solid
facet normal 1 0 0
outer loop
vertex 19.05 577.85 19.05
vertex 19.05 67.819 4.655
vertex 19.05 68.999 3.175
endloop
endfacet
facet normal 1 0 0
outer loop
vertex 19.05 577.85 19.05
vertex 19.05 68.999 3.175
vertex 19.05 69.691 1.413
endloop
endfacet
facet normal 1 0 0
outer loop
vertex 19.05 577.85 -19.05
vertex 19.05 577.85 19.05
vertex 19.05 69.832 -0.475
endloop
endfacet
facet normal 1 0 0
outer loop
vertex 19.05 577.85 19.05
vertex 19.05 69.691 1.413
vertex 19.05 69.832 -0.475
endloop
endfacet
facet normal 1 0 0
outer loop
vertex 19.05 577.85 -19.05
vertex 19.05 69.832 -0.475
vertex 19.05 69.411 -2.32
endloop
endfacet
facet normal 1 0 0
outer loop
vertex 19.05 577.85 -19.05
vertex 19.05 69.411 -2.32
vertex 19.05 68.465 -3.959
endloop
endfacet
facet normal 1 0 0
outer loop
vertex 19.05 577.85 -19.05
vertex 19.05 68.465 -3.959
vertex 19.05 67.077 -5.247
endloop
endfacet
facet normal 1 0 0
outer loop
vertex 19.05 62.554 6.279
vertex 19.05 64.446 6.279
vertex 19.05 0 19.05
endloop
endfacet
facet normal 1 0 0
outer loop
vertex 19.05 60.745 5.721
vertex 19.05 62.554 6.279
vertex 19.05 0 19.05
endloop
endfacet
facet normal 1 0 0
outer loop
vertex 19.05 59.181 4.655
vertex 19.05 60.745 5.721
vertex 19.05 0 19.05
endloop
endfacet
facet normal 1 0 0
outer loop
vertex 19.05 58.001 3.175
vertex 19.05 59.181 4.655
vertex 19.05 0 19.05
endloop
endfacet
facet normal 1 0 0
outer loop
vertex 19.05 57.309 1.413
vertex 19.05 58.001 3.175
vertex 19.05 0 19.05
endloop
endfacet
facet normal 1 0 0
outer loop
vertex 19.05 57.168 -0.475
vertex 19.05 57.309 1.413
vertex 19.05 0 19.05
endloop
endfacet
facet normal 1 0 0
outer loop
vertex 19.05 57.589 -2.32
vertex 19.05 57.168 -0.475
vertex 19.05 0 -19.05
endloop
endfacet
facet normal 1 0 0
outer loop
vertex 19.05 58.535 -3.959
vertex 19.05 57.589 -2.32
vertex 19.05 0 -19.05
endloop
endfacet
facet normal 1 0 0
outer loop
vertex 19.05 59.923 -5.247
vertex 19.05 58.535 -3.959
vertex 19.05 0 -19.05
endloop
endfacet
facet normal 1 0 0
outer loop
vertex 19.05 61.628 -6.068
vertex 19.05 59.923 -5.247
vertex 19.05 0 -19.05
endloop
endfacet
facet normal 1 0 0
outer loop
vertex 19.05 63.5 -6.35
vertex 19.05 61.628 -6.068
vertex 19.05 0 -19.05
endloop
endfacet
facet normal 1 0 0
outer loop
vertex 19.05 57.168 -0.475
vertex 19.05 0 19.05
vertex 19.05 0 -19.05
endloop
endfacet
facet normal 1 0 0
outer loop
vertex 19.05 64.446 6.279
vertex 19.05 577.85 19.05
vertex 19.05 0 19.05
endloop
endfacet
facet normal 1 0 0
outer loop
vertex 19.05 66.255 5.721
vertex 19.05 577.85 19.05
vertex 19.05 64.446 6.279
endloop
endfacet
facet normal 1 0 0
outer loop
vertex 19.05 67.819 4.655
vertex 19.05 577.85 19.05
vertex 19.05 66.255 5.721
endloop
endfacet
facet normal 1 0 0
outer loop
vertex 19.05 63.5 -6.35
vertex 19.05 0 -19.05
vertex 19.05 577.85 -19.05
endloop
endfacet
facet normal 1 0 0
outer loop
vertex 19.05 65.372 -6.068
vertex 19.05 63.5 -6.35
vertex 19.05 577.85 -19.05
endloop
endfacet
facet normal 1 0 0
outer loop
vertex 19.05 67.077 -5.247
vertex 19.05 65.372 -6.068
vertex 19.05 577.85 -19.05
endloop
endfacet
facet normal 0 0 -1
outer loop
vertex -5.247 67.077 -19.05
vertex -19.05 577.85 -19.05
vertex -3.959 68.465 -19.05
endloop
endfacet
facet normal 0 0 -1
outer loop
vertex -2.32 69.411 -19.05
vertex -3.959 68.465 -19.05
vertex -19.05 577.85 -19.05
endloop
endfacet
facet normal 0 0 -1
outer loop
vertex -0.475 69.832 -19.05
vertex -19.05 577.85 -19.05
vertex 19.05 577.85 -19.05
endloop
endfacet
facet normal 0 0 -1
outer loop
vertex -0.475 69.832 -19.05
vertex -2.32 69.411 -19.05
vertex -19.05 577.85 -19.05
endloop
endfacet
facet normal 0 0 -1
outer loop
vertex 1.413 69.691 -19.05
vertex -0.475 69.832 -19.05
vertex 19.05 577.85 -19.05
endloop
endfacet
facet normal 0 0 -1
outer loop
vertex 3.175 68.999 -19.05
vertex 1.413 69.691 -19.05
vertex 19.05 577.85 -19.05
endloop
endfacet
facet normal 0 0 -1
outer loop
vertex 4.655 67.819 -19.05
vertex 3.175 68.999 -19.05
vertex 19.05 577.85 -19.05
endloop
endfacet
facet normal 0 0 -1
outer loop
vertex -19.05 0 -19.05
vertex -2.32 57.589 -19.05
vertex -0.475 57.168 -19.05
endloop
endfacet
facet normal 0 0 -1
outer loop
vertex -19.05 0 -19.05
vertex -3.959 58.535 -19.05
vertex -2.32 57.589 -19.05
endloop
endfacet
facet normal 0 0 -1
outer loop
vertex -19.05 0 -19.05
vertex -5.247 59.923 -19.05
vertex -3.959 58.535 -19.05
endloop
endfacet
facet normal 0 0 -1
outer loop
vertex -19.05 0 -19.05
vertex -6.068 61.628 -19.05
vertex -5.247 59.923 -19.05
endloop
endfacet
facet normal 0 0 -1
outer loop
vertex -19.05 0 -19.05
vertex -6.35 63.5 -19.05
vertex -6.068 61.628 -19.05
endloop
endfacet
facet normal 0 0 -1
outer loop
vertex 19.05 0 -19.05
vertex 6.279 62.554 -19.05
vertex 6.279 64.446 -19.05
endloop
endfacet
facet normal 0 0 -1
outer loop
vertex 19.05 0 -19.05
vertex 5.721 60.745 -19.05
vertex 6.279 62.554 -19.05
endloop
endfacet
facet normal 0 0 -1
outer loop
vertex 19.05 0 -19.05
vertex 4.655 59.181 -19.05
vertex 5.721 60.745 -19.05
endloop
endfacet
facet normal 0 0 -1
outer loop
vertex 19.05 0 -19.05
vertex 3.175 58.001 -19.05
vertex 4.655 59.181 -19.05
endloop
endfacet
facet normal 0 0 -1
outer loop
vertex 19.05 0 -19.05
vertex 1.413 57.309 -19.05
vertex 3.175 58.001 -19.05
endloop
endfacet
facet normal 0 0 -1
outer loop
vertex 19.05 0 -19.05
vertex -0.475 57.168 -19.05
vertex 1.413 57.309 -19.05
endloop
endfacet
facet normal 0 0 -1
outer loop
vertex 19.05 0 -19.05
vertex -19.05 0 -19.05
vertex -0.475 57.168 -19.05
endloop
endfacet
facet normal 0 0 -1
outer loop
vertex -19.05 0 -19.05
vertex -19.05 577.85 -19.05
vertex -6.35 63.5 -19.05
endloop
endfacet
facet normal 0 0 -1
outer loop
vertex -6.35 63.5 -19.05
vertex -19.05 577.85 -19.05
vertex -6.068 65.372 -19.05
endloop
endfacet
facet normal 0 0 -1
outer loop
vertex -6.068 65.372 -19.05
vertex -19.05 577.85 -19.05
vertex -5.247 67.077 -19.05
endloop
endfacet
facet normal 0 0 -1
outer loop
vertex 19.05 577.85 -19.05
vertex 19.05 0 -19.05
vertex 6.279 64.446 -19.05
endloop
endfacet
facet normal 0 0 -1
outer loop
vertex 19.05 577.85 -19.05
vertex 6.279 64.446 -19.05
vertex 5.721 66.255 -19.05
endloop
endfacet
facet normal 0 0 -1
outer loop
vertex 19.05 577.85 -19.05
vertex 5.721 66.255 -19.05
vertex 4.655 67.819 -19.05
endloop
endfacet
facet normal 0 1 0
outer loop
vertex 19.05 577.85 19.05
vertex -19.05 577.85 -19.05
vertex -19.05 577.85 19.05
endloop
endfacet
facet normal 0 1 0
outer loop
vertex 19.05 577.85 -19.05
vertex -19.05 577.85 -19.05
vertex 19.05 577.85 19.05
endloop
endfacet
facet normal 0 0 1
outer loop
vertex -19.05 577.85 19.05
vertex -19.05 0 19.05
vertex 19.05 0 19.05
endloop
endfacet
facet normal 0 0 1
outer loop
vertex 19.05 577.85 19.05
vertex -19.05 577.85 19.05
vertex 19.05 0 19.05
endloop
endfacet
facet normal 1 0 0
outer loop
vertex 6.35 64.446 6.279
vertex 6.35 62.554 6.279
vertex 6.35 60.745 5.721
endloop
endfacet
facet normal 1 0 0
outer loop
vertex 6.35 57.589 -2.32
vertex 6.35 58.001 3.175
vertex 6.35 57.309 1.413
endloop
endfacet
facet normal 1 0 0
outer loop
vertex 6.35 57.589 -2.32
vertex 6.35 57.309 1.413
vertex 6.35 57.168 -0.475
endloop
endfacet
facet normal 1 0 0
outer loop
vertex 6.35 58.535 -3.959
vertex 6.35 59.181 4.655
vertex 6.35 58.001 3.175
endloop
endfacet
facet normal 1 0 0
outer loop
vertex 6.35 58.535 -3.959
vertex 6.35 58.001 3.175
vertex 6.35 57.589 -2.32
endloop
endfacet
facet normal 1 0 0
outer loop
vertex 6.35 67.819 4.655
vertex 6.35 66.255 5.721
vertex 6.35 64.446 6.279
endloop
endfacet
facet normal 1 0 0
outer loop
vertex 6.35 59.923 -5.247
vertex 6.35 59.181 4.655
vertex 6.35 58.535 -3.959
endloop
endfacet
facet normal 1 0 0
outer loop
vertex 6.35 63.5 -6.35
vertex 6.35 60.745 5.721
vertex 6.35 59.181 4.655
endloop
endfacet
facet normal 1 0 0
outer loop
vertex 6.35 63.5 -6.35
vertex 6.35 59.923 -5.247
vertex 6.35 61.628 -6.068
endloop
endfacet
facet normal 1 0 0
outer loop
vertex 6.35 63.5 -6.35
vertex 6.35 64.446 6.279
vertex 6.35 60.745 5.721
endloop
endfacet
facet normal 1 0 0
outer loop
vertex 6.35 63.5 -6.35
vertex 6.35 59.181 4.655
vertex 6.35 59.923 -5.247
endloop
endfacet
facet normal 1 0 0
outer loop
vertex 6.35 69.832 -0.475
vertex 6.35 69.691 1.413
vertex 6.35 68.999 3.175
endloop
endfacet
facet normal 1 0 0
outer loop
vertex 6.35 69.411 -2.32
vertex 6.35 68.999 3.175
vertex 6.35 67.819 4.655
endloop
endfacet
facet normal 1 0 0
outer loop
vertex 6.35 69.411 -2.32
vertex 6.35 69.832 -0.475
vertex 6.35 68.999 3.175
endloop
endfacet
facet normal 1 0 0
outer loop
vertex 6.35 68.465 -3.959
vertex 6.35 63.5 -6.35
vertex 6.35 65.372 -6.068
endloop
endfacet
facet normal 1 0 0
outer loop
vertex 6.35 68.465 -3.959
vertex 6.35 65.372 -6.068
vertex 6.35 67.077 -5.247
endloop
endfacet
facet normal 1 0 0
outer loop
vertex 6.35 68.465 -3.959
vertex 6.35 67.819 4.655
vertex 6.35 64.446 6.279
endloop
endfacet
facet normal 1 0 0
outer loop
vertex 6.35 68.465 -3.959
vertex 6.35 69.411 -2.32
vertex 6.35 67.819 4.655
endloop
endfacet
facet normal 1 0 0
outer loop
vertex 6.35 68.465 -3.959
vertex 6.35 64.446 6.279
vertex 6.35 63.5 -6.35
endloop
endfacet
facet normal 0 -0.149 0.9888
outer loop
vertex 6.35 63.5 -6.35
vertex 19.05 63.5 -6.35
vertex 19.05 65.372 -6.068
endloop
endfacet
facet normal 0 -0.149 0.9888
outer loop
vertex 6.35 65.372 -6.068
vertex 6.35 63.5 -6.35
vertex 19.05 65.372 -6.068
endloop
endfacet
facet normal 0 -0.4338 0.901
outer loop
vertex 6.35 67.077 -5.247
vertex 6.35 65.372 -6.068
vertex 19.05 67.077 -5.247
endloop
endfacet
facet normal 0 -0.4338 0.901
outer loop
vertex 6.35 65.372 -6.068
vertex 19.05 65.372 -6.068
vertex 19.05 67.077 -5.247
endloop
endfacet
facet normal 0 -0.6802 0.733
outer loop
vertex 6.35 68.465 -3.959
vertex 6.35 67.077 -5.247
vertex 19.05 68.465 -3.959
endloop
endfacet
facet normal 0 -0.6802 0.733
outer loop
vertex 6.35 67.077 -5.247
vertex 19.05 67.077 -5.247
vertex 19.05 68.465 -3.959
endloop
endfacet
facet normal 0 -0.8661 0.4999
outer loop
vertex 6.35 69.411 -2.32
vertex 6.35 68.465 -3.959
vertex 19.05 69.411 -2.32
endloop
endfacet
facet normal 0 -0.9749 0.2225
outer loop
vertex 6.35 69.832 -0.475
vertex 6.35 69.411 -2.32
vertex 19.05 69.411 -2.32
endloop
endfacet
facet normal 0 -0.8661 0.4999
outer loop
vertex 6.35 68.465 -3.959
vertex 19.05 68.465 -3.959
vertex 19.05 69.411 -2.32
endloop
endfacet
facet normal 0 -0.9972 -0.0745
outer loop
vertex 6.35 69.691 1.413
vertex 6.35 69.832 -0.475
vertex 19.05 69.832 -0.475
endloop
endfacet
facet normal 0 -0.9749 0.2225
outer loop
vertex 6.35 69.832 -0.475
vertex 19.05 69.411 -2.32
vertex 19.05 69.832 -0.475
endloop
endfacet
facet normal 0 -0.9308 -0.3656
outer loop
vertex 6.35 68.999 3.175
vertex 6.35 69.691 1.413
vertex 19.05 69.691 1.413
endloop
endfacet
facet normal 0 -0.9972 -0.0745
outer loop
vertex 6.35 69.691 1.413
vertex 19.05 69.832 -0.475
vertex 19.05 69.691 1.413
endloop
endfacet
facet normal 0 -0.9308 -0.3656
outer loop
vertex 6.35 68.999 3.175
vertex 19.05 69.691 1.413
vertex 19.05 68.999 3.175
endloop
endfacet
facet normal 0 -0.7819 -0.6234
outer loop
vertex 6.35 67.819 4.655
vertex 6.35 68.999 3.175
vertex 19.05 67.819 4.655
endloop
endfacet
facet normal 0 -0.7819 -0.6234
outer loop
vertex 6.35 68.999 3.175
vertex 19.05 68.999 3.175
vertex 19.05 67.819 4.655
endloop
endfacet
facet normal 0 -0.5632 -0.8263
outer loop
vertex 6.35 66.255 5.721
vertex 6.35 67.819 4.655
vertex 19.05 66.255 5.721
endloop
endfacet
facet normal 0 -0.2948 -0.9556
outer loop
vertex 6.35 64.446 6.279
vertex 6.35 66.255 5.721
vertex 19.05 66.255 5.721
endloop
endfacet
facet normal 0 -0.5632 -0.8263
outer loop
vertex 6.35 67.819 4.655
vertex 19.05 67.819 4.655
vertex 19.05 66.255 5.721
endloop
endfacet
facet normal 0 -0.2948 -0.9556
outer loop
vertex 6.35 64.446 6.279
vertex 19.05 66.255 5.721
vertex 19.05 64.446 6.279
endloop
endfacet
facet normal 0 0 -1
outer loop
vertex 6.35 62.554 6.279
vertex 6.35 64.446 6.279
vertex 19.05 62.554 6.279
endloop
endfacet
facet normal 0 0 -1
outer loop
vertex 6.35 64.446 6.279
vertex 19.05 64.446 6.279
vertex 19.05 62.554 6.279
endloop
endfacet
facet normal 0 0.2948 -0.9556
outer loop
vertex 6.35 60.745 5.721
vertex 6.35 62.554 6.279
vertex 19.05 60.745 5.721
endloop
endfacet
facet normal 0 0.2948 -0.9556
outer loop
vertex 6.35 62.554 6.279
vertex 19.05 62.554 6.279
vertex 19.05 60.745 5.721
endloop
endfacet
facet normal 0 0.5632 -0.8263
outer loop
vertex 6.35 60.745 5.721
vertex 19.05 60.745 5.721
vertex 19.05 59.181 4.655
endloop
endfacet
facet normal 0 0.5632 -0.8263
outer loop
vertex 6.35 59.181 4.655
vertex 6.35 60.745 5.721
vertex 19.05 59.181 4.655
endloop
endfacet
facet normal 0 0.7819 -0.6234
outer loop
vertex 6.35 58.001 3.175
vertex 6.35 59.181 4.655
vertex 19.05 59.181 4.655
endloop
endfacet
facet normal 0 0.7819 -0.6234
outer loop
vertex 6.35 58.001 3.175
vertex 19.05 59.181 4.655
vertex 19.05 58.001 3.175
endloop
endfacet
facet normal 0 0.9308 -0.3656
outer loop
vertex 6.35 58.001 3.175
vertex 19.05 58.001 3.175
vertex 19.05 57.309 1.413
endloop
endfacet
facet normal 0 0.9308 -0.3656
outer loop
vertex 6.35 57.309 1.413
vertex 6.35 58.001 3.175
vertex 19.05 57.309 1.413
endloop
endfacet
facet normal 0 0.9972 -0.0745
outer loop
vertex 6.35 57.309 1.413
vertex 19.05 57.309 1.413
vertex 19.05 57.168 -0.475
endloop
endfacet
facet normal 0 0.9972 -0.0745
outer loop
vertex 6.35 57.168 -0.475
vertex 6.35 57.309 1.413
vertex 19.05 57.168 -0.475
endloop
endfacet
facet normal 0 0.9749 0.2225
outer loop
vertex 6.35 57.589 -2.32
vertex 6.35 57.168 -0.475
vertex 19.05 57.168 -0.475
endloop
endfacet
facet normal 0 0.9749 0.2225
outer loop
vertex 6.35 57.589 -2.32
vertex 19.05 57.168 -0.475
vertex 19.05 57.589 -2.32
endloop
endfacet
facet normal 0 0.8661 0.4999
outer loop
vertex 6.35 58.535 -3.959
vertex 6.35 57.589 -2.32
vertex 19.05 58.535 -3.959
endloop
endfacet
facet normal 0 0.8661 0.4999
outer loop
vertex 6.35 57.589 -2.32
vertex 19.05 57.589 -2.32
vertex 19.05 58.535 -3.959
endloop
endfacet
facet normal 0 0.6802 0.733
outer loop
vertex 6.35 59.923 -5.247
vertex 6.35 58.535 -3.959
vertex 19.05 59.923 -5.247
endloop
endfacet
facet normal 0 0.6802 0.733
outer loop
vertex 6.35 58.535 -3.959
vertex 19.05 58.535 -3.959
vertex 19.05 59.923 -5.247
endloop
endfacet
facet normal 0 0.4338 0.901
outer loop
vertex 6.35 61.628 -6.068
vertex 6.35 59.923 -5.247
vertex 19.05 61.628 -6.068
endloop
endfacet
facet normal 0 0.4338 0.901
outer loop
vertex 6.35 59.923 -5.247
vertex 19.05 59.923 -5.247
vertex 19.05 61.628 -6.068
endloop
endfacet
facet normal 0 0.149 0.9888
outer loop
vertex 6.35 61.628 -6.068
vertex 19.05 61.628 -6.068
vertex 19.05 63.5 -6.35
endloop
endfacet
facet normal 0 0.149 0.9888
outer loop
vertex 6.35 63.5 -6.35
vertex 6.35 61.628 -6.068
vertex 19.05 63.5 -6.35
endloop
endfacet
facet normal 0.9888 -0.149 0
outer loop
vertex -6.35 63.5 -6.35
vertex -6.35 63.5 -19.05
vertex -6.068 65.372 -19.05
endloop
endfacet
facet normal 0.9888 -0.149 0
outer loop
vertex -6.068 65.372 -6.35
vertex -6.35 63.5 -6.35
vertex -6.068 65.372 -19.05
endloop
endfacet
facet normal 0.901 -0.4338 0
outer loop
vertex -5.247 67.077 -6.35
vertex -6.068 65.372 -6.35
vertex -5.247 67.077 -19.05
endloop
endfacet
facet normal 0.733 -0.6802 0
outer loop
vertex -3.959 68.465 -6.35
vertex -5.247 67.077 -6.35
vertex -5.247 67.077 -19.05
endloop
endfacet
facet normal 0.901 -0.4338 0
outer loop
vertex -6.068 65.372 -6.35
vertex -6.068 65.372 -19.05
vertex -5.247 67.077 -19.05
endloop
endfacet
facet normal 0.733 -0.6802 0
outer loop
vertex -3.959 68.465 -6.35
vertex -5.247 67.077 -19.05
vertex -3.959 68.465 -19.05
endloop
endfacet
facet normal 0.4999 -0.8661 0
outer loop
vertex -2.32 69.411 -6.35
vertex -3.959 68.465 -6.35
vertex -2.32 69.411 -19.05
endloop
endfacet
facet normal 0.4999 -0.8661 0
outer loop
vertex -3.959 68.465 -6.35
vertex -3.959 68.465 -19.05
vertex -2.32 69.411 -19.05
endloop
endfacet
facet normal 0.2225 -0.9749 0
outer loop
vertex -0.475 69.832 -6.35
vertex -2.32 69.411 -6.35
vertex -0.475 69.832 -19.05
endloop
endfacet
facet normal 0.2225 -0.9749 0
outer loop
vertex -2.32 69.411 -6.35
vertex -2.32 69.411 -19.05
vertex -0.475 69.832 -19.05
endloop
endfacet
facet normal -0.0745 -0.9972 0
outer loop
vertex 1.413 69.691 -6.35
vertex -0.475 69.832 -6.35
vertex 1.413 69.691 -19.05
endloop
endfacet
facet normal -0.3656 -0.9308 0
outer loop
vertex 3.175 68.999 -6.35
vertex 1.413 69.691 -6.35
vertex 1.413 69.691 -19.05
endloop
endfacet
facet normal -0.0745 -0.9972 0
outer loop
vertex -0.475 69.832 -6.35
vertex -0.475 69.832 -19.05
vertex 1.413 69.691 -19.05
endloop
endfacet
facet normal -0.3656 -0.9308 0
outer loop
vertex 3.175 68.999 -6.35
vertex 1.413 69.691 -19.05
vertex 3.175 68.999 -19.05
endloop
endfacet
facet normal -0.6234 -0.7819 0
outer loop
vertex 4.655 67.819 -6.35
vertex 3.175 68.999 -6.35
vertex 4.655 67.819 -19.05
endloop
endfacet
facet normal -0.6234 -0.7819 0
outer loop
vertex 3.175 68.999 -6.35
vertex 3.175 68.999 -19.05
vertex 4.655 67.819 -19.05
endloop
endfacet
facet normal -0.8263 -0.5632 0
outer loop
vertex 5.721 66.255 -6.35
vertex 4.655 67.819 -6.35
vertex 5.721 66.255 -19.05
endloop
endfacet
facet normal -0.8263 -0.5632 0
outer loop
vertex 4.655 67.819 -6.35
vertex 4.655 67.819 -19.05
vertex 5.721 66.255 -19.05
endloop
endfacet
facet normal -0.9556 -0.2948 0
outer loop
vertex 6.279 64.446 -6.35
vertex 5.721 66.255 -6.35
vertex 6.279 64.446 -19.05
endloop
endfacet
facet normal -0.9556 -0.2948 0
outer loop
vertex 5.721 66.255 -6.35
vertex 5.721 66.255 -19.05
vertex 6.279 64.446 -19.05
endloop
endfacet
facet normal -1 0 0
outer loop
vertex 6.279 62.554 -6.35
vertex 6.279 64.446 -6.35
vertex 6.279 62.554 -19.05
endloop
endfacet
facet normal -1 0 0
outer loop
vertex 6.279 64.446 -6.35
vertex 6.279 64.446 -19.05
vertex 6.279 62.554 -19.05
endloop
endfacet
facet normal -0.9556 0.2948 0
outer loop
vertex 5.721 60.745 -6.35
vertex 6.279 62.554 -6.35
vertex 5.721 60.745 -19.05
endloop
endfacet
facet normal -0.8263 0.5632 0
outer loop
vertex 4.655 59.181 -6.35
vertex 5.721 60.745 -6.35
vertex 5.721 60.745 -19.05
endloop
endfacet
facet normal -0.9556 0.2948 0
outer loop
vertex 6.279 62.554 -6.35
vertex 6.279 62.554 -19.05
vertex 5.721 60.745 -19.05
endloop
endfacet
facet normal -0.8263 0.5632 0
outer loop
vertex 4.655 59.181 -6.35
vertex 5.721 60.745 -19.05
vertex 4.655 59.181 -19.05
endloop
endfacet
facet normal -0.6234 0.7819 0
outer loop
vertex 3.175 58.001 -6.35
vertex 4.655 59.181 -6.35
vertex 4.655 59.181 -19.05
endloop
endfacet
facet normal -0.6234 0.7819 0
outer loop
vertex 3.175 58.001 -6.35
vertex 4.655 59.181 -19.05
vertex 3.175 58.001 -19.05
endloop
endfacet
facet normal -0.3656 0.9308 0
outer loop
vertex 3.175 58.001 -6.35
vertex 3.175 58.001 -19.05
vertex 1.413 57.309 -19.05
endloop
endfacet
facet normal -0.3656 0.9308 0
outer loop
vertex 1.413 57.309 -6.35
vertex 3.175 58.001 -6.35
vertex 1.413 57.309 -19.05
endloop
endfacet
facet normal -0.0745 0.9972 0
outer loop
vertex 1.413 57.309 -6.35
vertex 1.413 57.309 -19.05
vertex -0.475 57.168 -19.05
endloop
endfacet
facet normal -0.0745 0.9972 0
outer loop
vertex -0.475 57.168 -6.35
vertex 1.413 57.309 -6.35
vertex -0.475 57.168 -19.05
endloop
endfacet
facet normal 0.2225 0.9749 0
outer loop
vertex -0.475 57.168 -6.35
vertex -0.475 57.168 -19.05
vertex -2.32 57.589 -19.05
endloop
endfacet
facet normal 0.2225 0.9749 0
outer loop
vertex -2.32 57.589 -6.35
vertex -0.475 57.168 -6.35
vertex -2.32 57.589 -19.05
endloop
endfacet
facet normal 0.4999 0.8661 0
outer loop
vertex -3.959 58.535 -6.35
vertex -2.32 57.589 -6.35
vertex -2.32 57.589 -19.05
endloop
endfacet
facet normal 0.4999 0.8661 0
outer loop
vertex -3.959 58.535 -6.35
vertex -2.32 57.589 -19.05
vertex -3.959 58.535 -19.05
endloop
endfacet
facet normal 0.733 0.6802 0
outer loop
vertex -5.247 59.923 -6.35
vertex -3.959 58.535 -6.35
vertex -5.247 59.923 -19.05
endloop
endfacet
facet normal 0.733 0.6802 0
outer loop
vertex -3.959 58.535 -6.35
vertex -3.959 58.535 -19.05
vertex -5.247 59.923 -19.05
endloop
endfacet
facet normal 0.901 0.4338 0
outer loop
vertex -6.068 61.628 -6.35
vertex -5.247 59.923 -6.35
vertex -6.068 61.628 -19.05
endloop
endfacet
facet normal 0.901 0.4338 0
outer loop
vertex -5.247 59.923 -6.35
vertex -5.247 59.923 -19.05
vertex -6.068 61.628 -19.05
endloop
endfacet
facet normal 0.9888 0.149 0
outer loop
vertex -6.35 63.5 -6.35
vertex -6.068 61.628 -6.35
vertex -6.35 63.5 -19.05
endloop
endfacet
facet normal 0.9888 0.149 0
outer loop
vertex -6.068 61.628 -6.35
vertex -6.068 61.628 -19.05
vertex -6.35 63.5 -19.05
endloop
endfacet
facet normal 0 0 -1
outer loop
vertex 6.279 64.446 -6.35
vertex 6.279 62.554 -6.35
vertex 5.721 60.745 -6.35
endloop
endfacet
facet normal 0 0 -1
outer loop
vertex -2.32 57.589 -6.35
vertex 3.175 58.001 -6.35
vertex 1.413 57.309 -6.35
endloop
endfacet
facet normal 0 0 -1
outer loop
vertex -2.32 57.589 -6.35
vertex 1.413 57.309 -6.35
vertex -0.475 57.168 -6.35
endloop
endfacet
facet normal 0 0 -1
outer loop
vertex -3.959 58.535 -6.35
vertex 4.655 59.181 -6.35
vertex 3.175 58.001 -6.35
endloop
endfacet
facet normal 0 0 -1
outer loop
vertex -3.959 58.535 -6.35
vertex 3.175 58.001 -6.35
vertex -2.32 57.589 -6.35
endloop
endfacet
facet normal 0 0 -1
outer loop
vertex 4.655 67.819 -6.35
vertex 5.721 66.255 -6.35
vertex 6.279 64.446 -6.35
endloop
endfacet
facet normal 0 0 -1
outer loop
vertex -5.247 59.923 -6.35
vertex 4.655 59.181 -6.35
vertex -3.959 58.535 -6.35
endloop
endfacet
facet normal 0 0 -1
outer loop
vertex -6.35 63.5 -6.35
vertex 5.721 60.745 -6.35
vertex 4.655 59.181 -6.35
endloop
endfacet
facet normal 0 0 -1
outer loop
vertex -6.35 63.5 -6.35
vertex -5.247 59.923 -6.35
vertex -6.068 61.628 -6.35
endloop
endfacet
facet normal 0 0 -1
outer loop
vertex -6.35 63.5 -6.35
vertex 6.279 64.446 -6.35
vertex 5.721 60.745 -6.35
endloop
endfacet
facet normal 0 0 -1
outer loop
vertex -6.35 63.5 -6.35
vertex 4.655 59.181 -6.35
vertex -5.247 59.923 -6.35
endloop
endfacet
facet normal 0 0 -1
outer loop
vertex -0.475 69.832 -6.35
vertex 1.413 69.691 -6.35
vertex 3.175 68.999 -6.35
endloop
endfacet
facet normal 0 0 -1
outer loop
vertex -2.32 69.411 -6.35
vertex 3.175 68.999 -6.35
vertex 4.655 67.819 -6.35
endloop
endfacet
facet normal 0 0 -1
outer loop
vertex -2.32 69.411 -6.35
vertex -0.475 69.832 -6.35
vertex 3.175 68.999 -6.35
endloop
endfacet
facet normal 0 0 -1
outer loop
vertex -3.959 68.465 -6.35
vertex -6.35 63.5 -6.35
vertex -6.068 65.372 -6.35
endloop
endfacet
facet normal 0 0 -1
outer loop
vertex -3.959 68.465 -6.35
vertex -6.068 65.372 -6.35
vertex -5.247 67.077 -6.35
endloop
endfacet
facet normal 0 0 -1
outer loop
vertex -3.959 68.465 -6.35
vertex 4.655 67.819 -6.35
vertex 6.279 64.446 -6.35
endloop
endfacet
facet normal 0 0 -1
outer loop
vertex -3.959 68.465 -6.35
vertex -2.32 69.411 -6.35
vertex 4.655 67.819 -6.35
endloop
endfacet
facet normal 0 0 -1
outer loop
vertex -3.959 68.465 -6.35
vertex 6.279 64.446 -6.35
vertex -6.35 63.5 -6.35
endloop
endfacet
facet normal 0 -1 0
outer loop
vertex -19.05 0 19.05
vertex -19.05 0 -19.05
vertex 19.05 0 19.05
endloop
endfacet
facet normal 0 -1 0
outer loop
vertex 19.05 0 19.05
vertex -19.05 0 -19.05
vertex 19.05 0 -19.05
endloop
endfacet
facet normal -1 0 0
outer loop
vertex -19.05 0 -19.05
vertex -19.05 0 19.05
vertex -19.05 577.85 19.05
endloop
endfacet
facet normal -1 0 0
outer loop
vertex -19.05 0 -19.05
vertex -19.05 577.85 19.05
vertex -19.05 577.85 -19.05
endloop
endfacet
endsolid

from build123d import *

# Parameters (mm, degrees)
CROQUIS1_W              = 38.1
CROQUIS1_H              = 38.1
SALIENTE_EXTRUIR1_DEPTH = 577.85
CROQUIS2_R              = 6.35
CORTAR_EXTRUIR1_DEPTH   = 12.7
CROQUIS4_R              = 6.35
CORTAR_EXTRUIR2_DEPTH   = 12.699746


with BuildPart() as part:
    # Croquis1 → Saliente-Extruir1 (new body)
    with BuildSketch(Plane(origin=(0, 0, 0), x_dir=(1, 0, 0), z_dir=(0, 1, 0))):
        Rectangle(CROQUIS1_W, CROQUIS1_H)
    extrude(amount=SALIENTE_EXTRUIR1_DEPTH)

    # Croquis2 → Cortar-Extruir1 (cut)
    with BuildSketch(Plane(origin=(19.05, 0, 0), x_dir=(0, 0, -1), z_dir=(1, 0, 0))):
        with Locations((0, 63.5)):
            Circle(CROQUIS2_R)
    extrude(amount=-CORTAR_EXTRUIR1_DEPTH, mode=Mode.SUBTRACT)

    # Croquis4 → Cortar-Extruir2 (cut)
    with BuildSketch(Plane(origin=(0, 0, -19.05), x_dir=(-1, 0, 0), z_dir=(0, 0, -1))):
        with Locations((0, 63.5)):
            Circle(CROQUIS4_R)
    extrude(amount=-CORTAR_EXTRUIR2_DEPTH, mode=Mode.SUBTRACT)


solid = part.part
